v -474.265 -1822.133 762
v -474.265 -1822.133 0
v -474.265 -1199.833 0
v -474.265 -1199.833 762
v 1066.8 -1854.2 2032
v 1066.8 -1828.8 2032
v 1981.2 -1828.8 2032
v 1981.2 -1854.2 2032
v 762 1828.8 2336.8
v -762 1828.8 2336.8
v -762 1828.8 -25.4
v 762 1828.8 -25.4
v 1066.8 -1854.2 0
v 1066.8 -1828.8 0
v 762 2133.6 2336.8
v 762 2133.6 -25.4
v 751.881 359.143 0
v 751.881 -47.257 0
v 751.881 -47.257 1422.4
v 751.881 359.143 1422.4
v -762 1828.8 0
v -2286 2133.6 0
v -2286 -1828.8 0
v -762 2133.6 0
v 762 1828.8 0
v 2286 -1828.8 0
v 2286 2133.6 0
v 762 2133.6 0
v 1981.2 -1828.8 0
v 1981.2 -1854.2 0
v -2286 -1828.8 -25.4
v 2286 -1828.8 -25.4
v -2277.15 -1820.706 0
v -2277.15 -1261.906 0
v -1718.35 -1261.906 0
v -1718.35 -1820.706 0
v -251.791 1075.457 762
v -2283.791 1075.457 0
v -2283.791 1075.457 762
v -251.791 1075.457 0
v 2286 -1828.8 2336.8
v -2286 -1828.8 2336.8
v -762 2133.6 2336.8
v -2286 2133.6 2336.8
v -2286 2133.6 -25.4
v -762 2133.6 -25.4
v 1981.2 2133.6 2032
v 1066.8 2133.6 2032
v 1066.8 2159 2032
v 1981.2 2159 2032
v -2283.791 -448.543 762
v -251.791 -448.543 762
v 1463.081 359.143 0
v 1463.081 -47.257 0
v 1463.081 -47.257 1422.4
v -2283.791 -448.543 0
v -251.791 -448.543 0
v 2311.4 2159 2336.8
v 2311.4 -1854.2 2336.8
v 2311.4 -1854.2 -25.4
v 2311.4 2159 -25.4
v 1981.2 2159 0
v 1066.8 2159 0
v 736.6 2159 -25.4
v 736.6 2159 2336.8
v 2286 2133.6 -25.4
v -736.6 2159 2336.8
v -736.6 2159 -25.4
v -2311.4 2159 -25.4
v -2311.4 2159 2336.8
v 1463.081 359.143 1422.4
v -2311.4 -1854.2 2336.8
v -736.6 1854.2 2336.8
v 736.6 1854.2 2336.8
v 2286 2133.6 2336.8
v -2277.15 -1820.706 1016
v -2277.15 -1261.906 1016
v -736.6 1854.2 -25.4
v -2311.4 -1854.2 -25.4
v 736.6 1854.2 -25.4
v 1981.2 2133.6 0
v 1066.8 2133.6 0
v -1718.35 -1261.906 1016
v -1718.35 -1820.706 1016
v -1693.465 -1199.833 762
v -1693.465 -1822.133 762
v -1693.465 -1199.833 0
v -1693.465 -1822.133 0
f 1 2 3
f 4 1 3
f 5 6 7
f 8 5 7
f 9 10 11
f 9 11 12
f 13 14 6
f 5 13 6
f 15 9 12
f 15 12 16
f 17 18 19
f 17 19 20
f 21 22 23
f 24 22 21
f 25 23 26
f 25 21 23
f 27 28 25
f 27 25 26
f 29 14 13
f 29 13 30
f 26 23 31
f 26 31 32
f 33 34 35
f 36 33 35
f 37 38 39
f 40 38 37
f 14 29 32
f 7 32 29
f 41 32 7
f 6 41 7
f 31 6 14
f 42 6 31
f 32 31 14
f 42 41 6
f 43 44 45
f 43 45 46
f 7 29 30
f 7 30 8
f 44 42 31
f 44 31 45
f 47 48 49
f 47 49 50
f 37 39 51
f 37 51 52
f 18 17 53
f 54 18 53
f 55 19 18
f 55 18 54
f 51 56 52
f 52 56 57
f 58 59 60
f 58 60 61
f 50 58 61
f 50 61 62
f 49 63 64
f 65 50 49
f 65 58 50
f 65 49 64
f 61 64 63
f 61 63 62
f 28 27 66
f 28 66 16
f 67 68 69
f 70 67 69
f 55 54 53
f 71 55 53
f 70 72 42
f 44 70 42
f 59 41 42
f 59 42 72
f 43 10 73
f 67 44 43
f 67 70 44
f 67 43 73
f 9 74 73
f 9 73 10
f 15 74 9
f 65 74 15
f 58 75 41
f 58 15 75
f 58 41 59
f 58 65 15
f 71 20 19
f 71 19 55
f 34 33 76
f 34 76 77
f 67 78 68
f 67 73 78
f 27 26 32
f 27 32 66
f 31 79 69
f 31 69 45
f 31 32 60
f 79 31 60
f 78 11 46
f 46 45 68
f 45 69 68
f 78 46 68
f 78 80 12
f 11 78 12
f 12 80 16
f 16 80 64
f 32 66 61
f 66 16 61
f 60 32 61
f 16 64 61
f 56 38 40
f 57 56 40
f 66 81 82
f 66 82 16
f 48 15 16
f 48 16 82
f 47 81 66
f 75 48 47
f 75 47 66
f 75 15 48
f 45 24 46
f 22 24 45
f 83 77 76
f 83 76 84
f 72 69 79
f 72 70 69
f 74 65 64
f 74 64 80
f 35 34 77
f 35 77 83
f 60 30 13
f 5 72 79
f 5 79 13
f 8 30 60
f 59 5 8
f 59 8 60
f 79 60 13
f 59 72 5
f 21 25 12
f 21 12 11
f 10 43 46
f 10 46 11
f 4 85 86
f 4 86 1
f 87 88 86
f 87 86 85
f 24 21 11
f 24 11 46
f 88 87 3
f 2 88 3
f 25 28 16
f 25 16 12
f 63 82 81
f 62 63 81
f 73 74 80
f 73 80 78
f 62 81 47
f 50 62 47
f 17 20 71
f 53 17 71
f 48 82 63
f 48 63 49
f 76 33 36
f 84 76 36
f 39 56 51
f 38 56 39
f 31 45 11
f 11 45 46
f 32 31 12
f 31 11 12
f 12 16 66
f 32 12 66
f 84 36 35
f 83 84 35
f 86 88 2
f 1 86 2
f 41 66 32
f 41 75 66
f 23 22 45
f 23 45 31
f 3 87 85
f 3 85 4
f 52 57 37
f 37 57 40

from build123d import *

# Parameters (mm, degrees)
F1_DEPTH      = 25.4
F3_DEPTH      = 2336.8
F3_DEPTH_BACK = 25.4
F4_W          = 914.4
F4_H          = 2032
F5_DEPTH      = 2159.001
F5_DEPTH_BACK = 1854.201
F6_W          = 2032
F6_H          = 1524
F7_DEPTH      = 762
F8_W          = 1219.2
F8_H          = 622.3
F9_DEPTH      = 762
F10_W         = 711.2
F10_H         = 406.4
F11_DEPTH     = 1422.4
F12_W         = 558.8
F12_H         = 558.8
F13_DEPTH     = 1016


with BuildPart() as f1:
    # F0 (on Top) → F1 (new body)
    with BuildSketch(Plane.XY):
        Polygon((-2286, -1828.8), (2286, -1828.8), (2286, 1828.8), (2286, 2133.6), (762, 2133.6), (762, 1828.8), (-762, 1828.8), (-762, 2133.6), (-2286, 2133.6), (-2286, 1828.8), align=None)
    extrude(amount=-F1_DEPTH)


with BuildPart() as f3:
    # F2 (on Top) → F3 (new body, two sides)
    with BuildSketch(Plane.XY) as f3_sk:
        Polygon((-2311.4, 2159), (-2311.4, 1828.8), (-2311.4, -1854.2), (2311.4, -1854.2), (2311.4, 1828.8), (2311.4, 2159), (736.6, 2159), (736.6, 1854.2), (-736.6, 1854.2), (-736.6, 2159), align=None)
        Polygon((2286, 1828.8), (2286, -1828.8), (-2286, -1828.8), (-2286, 1828.8), (-2286, 2133.6), (-762, 2133.6), (-762, 1828.8), (762, 1828.8), (762, 2133.6), (2286, 2133.6), align=None, mode=Mode.SUBTRACT)
    extrude(amount=F3_DEPTH)
    extrude(f3_sk.sketch, amount=-F3_DEPTH_BACK)

    # F4 (on Front) → F5 (cut, two sides)
    with BuildSketch(Plane.XZ) as f5_sk:
        with Locations((1524, 1016)):
            Rectangle(F4_W, F4_H)
    extrude(amount=-F5_DEPTH, mode=Mode.SUBTRACT)
    extrude(f5_sk.sketch, amount=F5_DEPTH_BACK, mode=Mode.SUBTRACT)


with BuildPart() as f7:
    # F6 (on Top) → F7 (new body)
    with BuildSketch(Plane.XY):
        with Locations((-1267.7912688641, 313.4567290545)):
            Rectangle(F6_W, F6_H)
    extrude(amount=F7_DEPTH)


with BuildPart() as f9:
    # F8 (on Top) → F9 (new body)
    with BuildSketch(Plane.XY):
        with Locations((-1083.8650912046, -1510.9829326626)):
            Rectangle(F8_W, F8_H)
    extrude(amount=F9_DEPTH)


with BuildPart() as f11:
    # F10 (on Top) → F11 (new body)
    with BuildSketch(Plane.XY):
        with Locations((1107.4812381009, 155.9432223439)):
            Rectangle(F10_W, F10_H)
    extrude(amount=F11_DEPTH)


with BuildPart() as f13:
    # F12 (on Top) → F13 (new body)
    with BuildSketch(Plane.XY):
        with Locations((-1997.7499693632, -1541.3061827421)):
            Rectangle(F12_W, F12_H)
    extrude(amount=F13_DEPTH)


solid = Compound([f1.part, f3.part, f7.part, f9.part, f11.part, f13.part])
